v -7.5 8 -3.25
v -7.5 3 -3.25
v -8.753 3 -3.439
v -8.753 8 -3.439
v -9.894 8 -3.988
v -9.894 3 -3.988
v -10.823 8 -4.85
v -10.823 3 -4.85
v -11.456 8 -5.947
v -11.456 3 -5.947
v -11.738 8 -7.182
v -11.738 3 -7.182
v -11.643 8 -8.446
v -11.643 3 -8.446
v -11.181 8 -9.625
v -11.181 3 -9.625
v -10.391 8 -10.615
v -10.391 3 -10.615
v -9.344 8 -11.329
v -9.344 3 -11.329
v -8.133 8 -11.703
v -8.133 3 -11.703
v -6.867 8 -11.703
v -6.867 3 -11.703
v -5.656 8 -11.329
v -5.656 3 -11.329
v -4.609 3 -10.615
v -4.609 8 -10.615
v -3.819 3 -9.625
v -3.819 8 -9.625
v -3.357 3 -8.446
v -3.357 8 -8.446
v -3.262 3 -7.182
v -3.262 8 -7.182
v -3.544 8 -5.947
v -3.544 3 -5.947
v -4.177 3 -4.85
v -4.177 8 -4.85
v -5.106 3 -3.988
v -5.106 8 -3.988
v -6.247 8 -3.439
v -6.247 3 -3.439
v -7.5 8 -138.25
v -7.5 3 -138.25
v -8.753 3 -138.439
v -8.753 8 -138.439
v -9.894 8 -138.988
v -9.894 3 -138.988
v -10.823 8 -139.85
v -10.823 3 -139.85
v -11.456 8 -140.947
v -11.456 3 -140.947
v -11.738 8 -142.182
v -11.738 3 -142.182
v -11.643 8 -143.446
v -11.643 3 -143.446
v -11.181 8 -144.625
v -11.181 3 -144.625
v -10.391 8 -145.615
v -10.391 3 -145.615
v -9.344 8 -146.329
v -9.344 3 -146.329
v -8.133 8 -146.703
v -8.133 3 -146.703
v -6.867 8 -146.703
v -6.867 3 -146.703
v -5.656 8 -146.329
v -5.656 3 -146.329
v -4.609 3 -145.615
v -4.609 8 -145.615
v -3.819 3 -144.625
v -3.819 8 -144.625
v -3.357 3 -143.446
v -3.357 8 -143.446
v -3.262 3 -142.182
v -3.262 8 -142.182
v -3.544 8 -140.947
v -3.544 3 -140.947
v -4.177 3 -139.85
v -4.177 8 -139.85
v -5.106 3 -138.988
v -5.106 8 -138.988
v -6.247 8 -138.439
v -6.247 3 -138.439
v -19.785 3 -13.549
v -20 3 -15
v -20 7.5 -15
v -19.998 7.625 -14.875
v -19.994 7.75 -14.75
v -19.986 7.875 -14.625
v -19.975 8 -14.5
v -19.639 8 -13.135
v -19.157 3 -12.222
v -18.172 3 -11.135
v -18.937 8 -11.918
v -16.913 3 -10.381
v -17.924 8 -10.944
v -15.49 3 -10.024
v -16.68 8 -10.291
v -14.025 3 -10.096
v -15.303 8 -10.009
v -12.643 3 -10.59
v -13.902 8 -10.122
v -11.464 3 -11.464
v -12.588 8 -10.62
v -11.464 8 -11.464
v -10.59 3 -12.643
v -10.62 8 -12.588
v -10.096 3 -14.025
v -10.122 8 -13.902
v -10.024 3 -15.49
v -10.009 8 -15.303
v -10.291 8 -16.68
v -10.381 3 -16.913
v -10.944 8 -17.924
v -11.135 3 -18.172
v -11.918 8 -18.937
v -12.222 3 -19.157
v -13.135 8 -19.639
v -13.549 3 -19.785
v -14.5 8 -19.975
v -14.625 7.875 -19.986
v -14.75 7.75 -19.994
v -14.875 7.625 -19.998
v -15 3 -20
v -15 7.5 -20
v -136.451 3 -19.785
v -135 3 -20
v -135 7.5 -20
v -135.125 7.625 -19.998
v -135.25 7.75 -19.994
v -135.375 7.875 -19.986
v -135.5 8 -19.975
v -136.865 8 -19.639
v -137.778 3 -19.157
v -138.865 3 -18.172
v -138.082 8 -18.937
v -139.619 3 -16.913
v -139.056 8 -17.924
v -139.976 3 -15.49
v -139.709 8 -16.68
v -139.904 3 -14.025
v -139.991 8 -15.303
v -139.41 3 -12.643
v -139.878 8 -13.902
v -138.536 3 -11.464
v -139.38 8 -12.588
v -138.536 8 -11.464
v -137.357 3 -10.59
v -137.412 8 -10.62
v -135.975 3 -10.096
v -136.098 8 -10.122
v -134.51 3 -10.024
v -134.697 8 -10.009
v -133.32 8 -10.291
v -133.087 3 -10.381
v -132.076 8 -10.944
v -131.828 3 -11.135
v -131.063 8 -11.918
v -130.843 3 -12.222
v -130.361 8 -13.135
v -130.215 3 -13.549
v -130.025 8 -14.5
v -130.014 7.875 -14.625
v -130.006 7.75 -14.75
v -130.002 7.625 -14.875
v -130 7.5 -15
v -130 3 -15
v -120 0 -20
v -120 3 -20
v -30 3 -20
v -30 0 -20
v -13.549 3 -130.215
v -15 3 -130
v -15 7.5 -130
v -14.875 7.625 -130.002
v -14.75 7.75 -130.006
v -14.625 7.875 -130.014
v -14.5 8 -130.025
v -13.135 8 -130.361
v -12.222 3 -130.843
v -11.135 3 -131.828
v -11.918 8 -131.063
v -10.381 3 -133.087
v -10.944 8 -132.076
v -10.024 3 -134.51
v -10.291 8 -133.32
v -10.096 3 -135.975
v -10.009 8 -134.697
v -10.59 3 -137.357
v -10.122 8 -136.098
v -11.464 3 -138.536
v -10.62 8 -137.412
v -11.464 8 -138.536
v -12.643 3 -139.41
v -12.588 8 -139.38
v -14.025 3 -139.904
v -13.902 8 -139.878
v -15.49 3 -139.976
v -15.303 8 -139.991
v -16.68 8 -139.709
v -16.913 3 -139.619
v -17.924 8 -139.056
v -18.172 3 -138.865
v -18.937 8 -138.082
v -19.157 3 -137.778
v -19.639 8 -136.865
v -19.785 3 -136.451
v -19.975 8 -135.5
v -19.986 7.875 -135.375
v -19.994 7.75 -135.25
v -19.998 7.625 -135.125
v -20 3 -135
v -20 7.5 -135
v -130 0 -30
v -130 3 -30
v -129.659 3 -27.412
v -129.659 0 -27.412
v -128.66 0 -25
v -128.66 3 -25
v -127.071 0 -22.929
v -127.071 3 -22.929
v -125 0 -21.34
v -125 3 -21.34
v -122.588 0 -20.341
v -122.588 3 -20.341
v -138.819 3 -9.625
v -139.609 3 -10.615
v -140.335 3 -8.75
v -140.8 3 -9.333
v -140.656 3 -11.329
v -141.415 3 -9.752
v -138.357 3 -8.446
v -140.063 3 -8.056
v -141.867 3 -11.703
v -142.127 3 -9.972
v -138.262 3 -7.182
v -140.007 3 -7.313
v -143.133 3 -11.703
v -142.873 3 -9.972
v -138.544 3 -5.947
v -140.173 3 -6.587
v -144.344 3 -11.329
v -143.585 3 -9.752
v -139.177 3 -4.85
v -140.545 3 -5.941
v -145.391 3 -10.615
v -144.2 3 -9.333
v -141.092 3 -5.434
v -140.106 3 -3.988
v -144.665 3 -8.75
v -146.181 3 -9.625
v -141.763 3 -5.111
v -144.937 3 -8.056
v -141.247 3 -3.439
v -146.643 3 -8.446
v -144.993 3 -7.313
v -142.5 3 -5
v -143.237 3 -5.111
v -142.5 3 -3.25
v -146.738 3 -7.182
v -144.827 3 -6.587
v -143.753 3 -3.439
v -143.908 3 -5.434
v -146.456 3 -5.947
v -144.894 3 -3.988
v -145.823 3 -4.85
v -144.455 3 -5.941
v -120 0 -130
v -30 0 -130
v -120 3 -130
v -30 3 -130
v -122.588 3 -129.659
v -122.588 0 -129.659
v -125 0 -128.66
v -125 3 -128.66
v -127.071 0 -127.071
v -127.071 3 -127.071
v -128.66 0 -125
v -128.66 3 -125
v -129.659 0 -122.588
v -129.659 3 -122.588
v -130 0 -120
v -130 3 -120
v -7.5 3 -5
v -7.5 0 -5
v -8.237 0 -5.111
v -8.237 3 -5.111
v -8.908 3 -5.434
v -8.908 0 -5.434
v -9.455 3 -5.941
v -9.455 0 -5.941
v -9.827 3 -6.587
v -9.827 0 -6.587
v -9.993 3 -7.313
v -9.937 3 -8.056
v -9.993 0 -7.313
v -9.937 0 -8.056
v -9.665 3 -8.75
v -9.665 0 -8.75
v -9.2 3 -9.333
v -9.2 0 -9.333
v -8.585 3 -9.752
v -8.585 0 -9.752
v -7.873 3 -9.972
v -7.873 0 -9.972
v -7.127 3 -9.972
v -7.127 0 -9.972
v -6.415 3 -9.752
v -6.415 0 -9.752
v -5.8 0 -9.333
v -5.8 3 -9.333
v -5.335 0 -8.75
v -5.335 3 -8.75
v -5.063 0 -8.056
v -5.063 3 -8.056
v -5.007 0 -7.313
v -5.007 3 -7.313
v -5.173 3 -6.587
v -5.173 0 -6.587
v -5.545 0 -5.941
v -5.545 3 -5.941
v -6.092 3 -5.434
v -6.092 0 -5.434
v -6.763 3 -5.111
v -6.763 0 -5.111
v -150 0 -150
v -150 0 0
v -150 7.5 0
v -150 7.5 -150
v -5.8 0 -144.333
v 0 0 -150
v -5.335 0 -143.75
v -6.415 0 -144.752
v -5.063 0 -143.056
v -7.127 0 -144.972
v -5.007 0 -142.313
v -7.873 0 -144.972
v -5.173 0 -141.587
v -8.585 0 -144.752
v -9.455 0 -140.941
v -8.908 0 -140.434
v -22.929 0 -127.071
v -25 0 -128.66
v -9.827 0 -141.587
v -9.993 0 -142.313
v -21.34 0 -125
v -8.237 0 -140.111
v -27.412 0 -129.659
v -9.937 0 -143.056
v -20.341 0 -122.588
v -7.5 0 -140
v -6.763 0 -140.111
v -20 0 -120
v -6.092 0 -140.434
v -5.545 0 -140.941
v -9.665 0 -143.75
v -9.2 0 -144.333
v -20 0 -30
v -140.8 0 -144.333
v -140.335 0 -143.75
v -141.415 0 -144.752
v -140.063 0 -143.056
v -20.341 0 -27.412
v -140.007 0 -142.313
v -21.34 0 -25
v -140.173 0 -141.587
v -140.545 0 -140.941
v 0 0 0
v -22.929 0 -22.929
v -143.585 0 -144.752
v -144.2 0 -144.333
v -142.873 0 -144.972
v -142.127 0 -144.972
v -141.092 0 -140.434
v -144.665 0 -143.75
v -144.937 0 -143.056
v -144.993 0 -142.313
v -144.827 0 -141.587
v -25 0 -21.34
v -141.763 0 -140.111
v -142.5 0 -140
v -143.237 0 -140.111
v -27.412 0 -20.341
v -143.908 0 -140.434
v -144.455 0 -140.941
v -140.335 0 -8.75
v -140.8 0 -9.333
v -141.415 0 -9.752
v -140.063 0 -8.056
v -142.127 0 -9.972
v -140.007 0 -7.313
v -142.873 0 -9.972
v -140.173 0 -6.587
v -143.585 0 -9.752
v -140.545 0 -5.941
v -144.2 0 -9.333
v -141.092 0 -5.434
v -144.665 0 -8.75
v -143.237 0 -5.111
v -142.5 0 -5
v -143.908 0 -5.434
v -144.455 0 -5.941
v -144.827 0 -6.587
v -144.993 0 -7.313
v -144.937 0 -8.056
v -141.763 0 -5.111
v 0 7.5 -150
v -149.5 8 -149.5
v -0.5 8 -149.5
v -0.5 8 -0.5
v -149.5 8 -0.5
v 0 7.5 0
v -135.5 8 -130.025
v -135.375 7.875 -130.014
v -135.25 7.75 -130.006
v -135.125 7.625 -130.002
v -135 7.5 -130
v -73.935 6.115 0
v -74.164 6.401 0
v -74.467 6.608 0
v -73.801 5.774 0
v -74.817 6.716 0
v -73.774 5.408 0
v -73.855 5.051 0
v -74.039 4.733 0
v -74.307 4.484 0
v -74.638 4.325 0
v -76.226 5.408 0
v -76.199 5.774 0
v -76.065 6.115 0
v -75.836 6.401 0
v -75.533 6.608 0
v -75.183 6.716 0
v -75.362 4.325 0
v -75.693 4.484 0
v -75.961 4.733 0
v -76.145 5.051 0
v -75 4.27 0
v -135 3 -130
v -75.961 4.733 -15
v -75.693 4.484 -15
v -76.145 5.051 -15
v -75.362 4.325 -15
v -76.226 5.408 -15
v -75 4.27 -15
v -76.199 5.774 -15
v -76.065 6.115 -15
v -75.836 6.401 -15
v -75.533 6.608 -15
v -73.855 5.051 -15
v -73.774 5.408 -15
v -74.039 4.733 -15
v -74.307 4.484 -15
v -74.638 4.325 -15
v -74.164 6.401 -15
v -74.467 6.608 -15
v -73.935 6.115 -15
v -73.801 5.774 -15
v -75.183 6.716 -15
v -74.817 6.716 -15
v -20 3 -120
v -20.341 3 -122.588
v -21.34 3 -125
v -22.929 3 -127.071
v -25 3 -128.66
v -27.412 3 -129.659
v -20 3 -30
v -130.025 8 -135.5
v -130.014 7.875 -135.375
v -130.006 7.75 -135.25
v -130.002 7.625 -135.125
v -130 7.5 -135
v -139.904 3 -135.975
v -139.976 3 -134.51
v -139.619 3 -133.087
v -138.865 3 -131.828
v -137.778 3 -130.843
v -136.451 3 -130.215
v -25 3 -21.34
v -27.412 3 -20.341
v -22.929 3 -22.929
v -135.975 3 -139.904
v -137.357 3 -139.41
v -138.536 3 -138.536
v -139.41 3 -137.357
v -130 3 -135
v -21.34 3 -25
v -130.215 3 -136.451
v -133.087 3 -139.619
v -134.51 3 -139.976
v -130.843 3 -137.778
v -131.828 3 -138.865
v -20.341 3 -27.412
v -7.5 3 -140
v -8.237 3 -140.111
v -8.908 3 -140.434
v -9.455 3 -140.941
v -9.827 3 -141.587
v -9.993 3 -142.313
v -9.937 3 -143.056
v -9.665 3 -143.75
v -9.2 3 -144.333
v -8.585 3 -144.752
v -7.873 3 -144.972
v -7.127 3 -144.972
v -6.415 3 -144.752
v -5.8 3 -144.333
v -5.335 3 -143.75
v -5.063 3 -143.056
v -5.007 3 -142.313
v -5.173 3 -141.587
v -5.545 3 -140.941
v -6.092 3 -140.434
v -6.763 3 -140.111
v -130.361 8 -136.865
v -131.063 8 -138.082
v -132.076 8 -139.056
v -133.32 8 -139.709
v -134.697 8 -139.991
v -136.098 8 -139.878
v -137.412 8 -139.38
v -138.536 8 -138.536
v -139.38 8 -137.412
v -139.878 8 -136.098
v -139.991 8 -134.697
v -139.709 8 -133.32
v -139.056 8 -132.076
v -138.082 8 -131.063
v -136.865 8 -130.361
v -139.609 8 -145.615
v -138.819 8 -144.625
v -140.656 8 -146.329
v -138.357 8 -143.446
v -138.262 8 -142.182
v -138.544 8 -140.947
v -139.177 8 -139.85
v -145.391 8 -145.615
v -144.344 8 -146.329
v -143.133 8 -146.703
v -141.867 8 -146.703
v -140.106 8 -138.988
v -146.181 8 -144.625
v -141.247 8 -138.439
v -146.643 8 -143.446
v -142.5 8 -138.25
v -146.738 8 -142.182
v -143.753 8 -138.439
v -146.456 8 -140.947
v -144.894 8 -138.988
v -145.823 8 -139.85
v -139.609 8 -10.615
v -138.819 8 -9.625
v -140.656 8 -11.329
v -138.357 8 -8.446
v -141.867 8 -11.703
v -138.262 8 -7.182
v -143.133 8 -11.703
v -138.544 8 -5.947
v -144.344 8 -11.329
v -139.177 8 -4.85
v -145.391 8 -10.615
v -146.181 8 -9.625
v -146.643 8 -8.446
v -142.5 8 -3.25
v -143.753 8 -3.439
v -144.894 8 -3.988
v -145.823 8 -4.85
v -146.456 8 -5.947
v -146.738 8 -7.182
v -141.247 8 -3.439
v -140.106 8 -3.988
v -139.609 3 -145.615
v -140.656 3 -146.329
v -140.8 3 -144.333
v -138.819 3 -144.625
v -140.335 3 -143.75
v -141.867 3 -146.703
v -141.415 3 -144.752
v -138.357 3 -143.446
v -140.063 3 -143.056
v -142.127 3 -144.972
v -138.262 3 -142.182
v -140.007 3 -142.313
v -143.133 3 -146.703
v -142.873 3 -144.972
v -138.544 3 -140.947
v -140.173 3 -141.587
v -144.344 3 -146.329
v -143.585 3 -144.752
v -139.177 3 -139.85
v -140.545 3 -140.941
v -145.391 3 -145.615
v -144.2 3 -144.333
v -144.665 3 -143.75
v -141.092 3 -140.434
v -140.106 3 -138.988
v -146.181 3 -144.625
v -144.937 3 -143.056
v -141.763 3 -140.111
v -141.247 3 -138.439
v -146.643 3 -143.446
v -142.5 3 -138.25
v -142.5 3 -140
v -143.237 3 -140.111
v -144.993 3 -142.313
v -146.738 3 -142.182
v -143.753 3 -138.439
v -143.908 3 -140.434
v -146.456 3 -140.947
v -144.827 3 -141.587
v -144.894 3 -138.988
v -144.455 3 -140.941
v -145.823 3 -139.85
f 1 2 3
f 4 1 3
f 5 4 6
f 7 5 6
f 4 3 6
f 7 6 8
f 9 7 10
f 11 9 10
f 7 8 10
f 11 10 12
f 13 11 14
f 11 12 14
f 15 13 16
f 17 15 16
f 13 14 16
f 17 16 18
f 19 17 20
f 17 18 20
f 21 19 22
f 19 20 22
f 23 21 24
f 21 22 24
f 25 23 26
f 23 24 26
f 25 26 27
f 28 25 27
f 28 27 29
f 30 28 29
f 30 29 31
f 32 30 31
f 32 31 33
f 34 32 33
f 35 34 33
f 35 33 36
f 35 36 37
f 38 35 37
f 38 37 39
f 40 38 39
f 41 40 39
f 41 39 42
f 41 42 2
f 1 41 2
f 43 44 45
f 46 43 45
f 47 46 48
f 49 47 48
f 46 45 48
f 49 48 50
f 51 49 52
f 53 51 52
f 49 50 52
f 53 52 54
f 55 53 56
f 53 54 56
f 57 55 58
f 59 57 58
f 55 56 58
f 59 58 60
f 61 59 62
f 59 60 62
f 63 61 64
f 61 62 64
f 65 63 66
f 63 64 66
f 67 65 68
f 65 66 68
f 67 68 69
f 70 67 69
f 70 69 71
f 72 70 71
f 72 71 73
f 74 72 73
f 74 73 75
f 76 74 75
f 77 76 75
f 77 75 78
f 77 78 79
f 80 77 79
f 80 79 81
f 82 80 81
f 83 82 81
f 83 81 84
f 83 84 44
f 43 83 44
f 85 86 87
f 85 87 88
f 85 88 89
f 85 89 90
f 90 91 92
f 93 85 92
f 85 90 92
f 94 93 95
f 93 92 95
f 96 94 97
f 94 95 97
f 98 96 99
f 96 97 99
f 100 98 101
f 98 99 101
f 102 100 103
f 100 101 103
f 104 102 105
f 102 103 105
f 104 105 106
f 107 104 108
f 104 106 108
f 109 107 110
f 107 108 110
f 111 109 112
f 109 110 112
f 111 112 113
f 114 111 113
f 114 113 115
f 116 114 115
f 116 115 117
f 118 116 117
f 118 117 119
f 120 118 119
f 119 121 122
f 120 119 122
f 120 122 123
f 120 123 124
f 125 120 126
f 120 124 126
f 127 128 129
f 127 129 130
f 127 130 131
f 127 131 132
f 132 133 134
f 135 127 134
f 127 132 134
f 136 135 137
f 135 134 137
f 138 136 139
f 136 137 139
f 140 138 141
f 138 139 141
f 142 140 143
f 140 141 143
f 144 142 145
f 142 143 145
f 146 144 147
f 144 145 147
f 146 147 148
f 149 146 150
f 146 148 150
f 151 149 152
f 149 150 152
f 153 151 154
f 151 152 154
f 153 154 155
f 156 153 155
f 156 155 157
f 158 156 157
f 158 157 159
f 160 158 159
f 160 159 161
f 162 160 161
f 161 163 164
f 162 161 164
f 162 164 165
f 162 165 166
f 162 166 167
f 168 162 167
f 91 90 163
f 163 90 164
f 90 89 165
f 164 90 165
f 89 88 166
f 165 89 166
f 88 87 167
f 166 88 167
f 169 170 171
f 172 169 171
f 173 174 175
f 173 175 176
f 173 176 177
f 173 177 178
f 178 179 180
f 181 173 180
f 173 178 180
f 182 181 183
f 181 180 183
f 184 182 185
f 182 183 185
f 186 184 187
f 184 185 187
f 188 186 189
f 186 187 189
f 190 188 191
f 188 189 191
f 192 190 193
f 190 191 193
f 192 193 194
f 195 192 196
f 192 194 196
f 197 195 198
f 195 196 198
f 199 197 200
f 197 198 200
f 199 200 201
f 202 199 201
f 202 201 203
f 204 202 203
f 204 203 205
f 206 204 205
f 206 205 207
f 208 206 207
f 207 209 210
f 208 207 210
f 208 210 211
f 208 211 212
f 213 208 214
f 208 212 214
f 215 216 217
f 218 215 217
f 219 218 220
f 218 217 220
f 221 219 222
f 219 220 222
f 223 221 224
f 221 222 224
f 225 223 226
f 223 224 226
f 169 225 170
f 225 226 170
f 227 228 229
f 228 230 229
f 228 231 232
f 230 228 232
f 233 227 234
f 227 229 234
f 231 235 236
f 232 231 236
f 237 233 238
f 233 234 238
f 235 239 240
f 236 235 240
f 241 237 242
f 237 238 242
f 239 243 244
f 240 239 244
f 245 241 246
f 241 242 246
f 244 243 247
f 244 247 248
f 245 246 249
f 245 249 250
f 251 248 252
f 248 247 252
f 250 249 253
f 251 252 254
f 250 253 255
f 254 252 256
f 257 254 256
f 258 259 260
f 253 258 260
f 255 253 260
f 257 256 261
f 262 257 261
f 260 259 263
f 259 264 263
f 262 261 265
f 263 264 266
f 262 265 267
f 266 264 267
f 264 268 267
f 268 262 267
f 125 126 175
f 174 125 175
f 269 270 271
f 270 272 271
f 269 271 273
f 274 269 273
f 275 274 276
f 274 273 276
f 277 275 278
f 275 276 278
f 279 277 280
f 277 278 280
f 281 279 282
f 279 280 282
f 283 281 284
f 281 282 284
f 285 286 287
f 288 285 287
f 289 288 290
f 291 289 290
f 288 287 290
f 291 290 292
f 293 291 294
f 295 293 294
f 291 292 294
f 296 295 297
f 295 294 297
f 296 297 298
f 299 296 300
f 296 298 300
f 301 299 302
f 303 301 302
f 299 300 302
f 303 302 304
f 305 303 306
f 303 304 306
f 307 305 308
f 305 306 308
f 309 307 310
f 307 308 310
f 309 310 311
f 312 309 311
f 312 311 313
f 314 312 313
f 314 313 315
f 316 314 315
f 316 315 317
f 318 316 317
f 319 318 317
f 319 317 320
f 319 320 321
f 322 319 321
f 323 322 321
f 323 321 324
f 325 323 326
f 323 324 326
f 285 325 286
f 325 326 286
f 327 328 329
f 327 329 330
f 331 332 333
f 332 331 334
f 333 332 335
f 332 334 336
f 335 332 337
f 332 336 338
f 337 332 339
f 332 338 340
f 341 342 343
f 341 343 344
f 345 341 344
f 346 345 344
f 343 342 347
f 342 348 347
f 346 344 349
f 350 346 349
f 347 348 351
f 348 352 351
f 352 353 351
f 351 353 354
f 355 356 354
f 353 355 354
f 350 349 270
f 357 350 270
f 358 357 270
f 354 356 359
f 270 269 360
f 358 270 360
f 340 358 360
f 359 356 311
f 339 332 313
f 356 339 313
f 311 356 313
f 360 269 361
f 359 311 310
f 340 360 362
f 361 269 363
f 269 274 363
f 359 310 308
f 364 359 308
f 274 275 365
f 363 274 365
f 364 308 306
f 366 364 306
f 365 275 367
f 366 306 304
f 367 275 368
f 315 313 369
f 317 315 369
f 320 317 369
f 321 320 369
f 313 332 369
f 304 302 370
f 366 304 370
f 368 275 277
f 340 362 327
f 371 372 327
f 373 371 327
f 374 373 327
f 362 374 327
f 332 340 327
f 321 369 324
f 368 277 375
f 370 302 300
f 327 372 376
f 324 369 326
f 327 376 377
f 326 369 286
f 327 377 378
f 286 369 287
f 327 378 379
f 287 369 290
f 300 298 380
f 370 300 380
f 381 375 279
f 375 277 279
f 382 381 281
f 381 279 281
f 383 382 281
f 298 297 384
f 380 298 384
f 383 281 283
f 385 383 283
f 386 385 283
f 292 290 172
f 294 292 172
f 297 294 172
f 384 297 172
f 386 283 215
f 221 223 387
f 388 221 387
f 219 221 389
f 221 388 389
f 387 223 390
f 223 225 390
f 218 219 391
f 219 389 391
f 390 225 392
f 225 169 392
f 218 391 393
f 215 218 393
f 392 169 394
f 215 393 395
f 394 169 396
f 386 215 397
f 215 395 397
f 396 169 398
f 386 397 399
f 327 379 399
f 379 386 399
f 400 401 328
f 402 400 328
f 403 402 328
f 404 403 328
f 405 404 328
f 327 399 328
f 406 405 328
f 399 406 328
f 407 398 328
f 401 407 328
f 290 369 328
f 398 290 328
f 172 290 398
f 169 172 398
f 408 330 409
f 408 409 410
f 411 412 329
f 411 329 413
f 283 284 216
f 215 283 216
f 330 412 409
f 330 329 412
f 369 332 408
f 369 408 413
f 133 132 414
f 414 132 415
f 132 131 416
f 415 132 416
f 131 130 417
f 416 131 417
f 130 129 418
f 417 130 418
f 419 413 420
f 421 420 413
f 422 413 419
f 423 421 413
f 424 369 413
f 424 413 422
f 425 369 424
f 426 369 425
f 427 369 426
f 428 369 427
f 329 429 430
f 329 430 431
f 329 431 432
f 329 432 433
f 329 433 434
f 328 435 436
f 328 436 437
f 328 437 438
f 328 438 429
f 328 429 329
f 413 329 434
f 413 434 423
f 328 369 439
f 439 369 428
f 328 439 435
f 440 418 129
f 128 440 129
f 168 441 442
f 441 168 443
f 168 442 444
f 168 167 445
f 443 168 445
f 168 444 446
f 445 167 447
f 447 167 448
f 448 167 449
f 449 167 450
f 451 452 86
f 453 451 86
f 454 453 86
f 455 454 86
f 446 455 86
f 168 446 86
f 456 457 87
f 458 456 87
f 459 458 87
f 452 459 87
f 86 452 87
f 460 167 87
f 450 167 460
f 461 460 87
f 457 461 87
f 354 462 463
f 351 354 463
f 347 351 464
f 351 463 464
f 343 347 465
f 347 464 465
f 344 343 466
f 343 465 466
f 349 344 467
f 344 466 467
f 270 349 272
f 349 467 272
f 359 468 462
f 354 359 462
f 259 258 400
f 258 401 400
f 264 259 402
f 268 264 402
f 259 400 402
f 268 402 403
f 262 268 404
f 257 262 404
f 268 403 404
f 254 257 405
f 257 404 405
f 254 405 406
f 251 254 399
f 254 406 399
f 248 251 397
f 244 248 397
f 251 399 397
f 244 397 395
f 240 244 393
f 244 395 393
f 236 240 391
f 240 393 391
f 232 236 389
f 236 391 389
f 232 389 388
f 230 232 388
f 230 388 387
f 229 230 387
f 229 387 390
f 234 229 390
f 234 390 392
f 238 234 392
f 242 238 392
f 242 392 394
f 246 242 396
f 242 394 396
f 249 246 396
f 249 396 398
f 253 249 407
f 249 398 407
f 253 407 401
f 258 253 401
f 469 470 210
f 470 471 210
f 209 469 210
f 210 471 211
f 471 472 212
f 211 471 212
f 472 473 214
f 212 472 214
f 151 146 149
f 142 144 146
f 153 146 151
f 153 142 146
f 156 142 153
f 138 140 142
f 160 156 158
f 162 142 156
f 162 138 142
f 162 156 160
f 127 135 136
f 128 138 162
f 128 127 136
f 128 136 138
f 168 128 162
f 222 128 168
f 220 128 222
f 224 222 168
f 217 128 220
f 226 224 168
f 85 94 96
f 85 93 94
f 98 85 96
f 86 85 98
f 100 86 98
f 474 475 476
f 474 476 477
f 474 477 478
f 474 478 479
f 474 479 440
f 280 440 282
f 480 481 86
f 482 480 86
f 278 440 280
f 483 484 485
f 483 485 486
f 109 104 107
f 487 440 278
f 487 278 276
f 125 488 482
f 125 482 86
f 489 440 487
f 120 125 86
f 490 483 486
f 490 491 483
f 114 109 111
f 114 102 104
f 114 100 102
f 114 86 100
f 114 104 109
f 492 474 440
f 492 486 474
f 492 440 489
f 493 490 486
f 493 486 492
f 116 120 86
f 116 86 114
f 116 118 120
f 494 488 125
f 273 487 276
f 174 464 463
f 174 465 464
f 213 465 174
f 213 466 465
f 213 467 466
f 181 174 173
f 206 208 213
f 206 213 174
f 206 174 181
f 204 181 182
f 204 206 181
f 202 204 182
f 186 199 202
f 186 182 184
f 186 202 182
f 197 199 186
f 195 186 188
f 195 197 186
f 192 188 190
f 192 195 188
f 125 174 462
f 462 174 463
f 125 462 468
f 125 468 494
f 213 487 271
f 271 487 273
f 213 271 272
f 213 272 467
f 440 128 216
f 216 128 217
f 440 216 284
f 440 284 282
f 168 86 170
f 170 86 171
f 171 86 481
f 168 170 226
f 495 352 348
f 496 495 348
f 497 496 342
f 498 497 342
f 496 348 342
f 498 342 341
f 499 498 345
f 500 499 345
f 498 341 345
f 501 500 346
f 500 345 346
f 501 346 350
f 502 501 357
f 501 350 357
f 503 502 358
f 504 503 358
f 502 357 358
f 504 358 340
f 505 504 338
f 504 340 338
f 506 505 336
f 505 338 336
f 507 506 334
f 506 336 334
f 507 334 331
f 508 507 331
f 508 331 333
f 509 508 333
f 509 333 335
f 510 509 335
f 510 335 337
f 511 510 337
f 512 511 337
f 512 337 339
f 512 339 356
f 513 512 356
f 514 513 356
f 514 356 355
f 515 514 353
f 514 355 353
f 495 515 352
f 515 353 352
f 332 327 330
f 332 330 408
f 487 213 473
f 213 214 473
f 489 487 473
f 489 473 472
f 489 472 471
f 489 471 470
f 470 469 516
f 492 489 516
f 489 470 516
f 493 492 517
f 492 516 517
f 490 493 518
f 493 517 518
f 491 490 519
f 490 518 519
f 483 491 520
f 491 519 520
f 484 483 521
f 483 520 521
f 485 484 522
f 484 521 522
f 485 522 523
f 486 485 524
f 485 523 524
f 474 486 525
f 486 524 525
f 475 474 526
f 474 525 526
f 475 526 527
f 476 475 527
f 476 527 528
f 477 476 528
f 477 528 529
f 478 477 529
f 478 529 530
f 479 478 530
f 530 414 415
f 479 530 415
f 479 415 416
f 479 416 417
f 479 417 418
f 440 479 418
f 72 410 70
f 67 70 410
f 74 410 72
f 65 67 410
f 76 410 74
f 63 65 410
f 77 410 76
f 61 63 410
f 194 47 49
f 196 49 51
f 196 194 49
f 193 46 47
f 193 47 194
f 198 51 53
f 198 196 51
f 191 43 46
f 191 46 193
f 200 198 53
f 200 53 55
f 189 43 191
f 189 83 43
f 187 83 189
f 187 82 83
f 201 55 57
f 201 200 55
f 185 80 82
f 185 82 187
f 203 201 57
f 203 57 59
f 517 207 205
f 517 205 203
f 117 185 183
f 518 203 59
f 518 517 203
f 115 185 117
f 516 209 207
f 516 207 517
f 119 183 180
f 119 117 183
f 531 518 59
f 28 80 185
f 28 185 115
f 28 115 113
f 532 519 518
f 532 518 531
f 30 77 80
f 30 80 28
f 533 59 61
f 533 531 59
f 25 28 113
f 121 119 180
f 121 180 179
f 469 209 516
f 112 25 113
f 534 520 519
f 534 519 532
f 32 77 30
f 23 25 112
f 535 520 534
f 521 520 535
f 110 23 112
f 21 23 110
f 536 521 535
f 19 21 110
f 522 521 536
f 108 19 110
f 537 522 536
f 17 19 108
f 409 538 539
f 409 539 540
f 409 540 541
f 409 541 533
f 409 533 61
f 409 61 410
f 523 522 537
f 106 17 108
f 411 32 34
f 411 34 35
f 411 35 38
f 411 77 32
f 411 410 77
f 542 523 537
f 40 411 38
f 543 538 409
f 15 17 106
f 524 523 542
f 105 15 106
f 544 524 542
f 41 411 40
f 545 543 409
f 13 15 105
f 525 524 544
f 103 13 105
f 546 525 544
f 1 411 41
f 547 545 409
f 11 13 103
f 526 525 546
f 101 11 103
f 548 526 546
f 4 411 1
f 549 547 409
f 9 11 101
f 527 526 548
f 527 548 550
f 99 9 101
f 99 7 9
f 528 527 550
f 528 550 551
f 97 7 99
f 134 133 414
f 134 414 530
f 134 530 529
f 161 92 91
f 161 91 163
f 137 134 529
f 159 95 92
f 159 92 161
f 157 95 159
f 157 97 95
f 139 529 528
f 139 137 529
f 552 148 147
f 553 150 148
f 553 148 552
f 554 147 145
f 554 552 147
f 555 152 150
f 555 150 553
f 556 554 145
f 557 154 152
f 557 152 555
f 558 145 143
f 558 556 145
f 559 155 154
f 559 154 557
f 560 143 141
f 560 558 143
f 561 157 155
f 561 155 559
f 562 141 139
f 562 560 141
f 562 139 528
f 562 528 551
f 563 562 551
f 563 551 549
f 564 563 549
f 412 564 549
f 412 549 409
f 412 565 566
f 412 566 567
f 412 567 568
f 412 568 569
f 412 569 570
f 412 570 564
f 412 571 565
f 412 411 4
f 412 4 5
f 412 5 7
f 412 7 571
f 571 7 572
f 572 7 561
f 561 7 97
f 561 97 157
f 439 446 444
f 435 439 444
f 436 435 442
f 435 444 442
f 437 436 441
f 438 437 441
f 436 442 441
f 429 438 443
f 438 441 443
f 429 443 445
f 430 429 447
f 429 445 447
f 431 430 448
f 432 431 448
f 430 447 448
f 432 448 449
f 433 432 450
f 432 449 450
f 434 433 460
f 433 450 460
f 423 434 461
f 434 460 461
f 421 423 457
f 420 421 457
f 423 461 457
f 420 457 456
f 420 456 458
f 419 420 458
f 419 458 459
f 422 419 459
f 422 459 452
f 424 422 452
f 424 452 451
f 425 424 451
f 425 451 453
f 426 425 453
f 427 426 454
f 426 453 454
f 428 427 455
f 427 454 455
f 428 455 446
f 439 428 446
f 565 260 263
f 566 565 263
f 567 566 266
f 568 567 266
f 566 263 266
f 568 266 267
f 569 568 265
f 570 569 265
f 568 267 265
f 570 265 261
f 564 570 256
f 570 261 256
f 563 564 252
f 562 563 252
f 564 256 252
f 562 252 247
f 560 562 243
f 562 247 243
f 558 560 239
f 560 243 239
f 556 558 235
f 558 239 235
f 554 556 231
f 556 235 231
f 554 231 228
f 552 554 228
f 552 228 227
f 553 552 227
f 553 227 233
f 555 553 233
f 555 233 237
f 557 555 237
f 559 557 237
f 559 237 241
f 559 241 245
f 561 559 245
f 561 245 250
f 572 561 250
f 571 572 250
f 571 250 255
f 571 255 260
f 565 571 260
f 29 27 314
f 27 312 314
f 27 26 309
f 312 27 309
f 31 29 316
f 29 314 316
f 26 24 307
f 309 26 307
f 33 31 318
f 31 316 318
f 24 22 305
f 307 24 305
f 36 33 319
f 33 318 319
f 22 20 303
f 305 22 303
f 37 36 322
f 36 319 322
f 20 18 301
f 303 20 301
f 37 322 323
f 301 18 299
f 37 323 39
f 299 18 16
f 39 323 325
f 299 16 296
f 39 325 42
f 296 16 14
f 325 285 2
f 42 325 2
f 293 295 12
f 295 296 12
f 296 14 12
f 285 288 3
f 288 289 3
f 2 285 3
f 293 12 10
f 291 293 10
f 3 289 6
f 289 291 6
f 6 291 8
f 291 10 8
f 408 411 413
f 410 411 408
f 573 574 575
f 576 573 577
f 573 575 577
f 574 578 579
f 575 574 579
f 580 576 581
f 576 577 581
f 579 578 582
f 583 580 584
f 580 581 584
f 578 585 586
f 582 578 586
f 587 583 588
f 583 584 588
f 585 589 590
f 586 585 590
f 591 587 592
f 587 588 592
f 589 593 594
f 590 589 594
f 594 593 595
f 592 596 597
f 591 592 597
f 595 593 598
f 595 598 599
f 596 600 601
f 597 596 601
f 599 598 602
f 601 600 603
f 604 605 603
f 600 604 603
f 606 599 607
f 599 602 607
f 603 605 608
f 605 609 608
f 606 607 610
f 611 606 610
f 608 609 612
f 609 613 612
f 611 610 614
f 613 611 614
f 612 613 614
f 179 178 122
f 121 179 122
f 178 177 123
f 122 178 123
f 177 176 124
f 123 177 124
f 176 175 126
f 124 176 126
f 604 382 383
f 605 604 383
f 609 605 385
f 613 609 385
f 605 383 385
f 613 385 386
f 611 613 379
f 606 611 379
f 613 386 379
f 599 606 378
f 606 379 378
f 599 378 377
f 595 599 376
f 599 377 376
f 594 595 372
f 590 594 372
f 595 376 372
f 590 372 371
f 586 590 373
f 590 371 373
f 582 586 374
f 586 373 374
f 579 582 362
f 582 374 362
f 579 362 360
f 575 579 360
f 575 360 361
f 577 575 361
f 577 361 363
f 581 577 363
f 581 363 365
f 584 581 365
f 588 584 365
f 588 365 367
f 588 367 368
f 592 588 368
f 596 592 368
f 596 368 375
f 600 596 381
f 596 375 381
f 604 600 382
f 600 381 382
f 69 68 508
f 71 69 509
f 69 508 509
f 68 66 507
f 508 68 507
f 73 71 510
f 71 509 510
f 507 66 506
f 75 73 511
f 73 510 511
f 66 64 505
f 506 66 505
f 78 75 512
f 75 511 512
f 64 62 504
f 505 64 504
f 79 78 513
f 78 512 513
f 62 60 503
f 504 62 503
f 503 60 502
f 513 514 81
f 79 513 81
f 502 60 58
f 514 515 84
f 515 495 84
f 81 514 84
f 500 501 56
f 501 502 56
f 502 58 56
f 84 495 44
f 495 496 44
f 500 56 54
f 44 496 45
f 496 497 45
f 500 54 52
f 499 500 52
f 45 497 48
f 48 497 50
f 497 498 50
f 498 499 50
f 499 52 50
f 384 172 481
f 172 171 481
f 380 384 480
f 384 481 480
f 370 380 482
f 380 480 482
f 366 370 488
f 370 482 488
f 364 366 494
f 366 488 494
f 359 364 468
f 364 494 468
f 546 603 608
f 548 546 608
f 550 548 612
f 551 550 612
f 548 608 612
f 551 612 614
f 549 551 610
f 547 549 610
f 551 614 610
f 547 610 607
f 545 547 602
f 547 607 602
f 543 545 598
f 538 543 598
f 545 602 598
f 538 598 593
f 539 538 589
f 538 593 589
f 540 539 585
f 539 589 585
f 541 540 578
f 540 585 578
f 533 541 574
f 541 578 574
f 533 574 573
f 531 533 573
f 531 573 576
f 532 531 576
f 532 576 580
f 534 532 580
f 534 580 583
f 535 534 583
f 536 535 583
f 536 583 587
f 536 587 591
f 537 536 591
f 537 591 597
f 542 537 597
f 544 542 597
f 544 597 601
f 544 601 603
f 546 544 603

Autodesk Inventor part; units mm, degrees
ref_plane "YZ Plane" through (0, 0, 0) normal (1, 0, 0) x (0, 1, 0)
ref_plane "XZ Plane" through (0, 0, 0) normal (0, 1, 0) x (-1, 0, 0)
ref_plane "XY Plane" through (0, 0, 0) normal (0, 0, 1) x (1, 0, 0)
sketch "Esboço1" plane through (0, 0, 0) normal (0, 1, 0) x (-1, 0, 0)
  line L0 (0, 0) -> (150, 0)
  line L1 (150, 0) -> (150, -150)
  line L2 (150, -150) -> (0, -150)
  line L3 (0, -150) -> (0, 0)
  dimension "d0" = 150
  dimension "d1" = 150
extrude "Extrusão1" add sketch "Esboço1" along normal blind 8
sketch "Esboço2" plane through (0, 8, 0) normal (0, 1, 0) x (1, 0, 0)
  line L0 (-135, 15) -> (-15, 15)
  line L1 (-15, 15) -> (-15, 135)
  line L2 (-15, 135) -> (-135, 135)
  line L3 (-135, 135) -> (-135, 15)
  line L4 (0, 150) -> (-150, 150) projected
  line L5 (0, 0) -> (0, 150) projected
  point P0 (-75, 135)
  point P1 (-75, 150)
  point P2 (0, 75)
  point P3 (-135, 75)
  dimension "d4" = 120
  dimension "d5" = 120
  dimension "d6" = 0
  dimension "d7" = 0
extrude "Extrusão2" cut sketch "Esboço2" against normal blind 5
sketch "Esboço3" plane through (0, 3, 0) normal (0, 1, 0) x (1, 0, 0)
  line L0 (-120, 20) -> (-30, 20)
  line L1 (-20, 30) -> (-20, 120)
  line L2 (-30, 130) -> (-120, 130)
  line L3 (-130, 120) -> (-130, 30)
  line L4 (-135, 15) -> (-135, 135) projected
  line L5 (-135, 135) -> (-15, 135) projected
  arc A0 (-120, 130) -> (-130, 120) centre (-120, 120) ccw
  arc A1 (-20, 120) -> (-30, 130) centre (-30, 120) ccw
  arc A2 (-30, 20) -> (-20, 30) centre (-30, 30) ccw
  arc A3 (-130, 30) -> (-120, 20) centre (-120, 30) ccw
  point P0 (0, 0)
  point P1 (-130, 20)
  point P2 (-20, 130)
  point P3 (-20, 20)
  point P4 (-130, 130)
  point P5 (-135, 75)
  point P6 (-130, 75)
  point P7 (-75, 135)
  point P8 (-75, 130)
  dimension "d10" = 110
  dimension "d11" = 0
  dimension "d12" = 0
  dimension "d52" = 10
extrude "Extrusão3" cut sketch "Esboço3" against normal up to surface (3 mm away)
sketch "Esboço4" plane through (0, 8, 0) normal (0, 1, 0) x (1, 0, 0)
  circle A0 centre (-15, 15) radius 5
  circle A1 centre (-135, 15) radius 5
  circle A2 centre (-135, 135) radius 5
  circle A3 centre (-15, 135) radius 5
  line L0 (-15, 135) -> (-15, 15) projected
  line L1 (-15, 15) -> (-135, 15) projected
  line L2 (-135, 15) -> (-135, 135) projected
  line L3 (-135, 135) -> (-15, 135) projected
  point P0 (0, 0)
  dimension "d15" = 10
  dimension "d16" = 0
  dimension "d17" = 0
  dimension "d18" = 0
  dimension "d19" = 0
  dimension "d20" = 0
  dimension "d21" = 0
  dimension "d22" = 0
  dimension "d23" = 0
extrude "Extrusão4" cut sketch "Esboço4" against normal blind 5 contours A0 L1 L0 | L0 L1 A0 | L0 L3 A3 | A3 L3 L0 | L1 L2 A1 | A1 L2 L1 | L3 L2 A2 | A2 L2 L3
sketch "Esboço5" plane through (-150, 0, 0) normal (0, 0, 1) x (1, 0, 0)
  line L0 (130, 3) -> (20, 3) projected
  line L1 (0, 8) -> (150, 8) projected
  point P0 (150, 0)
  point P1 (75, 5.5)
  point P2 (75, 8)
  dimension "d26" = 5
  dimension "d27" = 2.5
  dimension "d28" = 0
hole "Furo1" at (-75, 5.5, 0) direction (0, 0, -1) diameter 2.459 end up to surface thread size "M3x0.5" class "6H" standard "ISO Metric profile"
sketch "Esboço6" plane through (0, 8, 0) normal (0, 1, 0) x (1, 0, 0)
  line L0 (-150, 150) -> (-150, 0) projected
  line L1 (-135, 20) -> (-135, 130) projected
  line L2 (0, 150) -> (-150, 150) projected
  line L3 (0, 0) -> (0, 150) projected
  line L4 (-150, 0) -> (0, 0) projected
  point P0 (-142.5, 7.5)
  point P1 (-142.5, 142.5)
  point P2 (-7.5, 142.5)
  point P3 (-7.5, 7.5)
  point P4 (-135, 75)
  point P5 (-150, 75)
  dimension "d36" = 7.5
  dimension "d37" = 15
  dimension "d38" = 7.5
  dimension "d39" = 7.5
  dimension "d40" = 7.5
  dimension "d41" = 7.5
  dimension "d42" = 7.5
  dimension "d43" = 7.5
  dimension "d44" = 7.5
hole "Furo2" at (-142.5, 8, -7.5) at (-142.5, 8, -142.5) at (-7.5, 8, -142.5) at (-7.5, 8, -7.5) direction (0, -1, 0) diameter 5 depth 8 counterbore diameter 8.5 counterbore depth 5
chamfer "Chamfer1" distance 0.5 angle 45 8 edges at (-150, 8, -75) (-75, 8, -150) (0, 8, -75) (-75, 8, 0) (-75, 8, -15) (-15, 8, -75) (-75, 8, -135) (-135, 8, -75)
equation "\"d27\" = 0.5 * d26"
equation "\"d36\" = 0.5 * d37"
equation "\"d38\" = d36"
equation "\"d39\" = d36"
equation "\"d40\" = d36"
equation "\"d41\" = d40"
equation "\"d42\" = d41"
equation "\"d43\" = d42"
equation "\"d44\" = d43"
equation "\"Raio_vergadura\" = Espessura"
equation "\"Largura_alívio_de_vergadura\" = Espessura"
equation "\"Profundidade_alívio_de_vergadura\" = 0.5 * Espessura"
equation "\"Tamanho_alívio_de_dobra\" = 4 * Espessura"
equation "\"Remanescente_mínimo\" = 2 * Espessura"
equation "\"Raiodetransição\" = Raio_vergadura"
equation "\"Tamanho_de_raio_de_Jacobi\" = Raio_vergadura"
equation "\"TamanhoFolga\" = Espessura"
equation "\"Espessura\" = 0.5"
properties part number "Suporte base da mesa" material "Brass, Soft Yellow"
